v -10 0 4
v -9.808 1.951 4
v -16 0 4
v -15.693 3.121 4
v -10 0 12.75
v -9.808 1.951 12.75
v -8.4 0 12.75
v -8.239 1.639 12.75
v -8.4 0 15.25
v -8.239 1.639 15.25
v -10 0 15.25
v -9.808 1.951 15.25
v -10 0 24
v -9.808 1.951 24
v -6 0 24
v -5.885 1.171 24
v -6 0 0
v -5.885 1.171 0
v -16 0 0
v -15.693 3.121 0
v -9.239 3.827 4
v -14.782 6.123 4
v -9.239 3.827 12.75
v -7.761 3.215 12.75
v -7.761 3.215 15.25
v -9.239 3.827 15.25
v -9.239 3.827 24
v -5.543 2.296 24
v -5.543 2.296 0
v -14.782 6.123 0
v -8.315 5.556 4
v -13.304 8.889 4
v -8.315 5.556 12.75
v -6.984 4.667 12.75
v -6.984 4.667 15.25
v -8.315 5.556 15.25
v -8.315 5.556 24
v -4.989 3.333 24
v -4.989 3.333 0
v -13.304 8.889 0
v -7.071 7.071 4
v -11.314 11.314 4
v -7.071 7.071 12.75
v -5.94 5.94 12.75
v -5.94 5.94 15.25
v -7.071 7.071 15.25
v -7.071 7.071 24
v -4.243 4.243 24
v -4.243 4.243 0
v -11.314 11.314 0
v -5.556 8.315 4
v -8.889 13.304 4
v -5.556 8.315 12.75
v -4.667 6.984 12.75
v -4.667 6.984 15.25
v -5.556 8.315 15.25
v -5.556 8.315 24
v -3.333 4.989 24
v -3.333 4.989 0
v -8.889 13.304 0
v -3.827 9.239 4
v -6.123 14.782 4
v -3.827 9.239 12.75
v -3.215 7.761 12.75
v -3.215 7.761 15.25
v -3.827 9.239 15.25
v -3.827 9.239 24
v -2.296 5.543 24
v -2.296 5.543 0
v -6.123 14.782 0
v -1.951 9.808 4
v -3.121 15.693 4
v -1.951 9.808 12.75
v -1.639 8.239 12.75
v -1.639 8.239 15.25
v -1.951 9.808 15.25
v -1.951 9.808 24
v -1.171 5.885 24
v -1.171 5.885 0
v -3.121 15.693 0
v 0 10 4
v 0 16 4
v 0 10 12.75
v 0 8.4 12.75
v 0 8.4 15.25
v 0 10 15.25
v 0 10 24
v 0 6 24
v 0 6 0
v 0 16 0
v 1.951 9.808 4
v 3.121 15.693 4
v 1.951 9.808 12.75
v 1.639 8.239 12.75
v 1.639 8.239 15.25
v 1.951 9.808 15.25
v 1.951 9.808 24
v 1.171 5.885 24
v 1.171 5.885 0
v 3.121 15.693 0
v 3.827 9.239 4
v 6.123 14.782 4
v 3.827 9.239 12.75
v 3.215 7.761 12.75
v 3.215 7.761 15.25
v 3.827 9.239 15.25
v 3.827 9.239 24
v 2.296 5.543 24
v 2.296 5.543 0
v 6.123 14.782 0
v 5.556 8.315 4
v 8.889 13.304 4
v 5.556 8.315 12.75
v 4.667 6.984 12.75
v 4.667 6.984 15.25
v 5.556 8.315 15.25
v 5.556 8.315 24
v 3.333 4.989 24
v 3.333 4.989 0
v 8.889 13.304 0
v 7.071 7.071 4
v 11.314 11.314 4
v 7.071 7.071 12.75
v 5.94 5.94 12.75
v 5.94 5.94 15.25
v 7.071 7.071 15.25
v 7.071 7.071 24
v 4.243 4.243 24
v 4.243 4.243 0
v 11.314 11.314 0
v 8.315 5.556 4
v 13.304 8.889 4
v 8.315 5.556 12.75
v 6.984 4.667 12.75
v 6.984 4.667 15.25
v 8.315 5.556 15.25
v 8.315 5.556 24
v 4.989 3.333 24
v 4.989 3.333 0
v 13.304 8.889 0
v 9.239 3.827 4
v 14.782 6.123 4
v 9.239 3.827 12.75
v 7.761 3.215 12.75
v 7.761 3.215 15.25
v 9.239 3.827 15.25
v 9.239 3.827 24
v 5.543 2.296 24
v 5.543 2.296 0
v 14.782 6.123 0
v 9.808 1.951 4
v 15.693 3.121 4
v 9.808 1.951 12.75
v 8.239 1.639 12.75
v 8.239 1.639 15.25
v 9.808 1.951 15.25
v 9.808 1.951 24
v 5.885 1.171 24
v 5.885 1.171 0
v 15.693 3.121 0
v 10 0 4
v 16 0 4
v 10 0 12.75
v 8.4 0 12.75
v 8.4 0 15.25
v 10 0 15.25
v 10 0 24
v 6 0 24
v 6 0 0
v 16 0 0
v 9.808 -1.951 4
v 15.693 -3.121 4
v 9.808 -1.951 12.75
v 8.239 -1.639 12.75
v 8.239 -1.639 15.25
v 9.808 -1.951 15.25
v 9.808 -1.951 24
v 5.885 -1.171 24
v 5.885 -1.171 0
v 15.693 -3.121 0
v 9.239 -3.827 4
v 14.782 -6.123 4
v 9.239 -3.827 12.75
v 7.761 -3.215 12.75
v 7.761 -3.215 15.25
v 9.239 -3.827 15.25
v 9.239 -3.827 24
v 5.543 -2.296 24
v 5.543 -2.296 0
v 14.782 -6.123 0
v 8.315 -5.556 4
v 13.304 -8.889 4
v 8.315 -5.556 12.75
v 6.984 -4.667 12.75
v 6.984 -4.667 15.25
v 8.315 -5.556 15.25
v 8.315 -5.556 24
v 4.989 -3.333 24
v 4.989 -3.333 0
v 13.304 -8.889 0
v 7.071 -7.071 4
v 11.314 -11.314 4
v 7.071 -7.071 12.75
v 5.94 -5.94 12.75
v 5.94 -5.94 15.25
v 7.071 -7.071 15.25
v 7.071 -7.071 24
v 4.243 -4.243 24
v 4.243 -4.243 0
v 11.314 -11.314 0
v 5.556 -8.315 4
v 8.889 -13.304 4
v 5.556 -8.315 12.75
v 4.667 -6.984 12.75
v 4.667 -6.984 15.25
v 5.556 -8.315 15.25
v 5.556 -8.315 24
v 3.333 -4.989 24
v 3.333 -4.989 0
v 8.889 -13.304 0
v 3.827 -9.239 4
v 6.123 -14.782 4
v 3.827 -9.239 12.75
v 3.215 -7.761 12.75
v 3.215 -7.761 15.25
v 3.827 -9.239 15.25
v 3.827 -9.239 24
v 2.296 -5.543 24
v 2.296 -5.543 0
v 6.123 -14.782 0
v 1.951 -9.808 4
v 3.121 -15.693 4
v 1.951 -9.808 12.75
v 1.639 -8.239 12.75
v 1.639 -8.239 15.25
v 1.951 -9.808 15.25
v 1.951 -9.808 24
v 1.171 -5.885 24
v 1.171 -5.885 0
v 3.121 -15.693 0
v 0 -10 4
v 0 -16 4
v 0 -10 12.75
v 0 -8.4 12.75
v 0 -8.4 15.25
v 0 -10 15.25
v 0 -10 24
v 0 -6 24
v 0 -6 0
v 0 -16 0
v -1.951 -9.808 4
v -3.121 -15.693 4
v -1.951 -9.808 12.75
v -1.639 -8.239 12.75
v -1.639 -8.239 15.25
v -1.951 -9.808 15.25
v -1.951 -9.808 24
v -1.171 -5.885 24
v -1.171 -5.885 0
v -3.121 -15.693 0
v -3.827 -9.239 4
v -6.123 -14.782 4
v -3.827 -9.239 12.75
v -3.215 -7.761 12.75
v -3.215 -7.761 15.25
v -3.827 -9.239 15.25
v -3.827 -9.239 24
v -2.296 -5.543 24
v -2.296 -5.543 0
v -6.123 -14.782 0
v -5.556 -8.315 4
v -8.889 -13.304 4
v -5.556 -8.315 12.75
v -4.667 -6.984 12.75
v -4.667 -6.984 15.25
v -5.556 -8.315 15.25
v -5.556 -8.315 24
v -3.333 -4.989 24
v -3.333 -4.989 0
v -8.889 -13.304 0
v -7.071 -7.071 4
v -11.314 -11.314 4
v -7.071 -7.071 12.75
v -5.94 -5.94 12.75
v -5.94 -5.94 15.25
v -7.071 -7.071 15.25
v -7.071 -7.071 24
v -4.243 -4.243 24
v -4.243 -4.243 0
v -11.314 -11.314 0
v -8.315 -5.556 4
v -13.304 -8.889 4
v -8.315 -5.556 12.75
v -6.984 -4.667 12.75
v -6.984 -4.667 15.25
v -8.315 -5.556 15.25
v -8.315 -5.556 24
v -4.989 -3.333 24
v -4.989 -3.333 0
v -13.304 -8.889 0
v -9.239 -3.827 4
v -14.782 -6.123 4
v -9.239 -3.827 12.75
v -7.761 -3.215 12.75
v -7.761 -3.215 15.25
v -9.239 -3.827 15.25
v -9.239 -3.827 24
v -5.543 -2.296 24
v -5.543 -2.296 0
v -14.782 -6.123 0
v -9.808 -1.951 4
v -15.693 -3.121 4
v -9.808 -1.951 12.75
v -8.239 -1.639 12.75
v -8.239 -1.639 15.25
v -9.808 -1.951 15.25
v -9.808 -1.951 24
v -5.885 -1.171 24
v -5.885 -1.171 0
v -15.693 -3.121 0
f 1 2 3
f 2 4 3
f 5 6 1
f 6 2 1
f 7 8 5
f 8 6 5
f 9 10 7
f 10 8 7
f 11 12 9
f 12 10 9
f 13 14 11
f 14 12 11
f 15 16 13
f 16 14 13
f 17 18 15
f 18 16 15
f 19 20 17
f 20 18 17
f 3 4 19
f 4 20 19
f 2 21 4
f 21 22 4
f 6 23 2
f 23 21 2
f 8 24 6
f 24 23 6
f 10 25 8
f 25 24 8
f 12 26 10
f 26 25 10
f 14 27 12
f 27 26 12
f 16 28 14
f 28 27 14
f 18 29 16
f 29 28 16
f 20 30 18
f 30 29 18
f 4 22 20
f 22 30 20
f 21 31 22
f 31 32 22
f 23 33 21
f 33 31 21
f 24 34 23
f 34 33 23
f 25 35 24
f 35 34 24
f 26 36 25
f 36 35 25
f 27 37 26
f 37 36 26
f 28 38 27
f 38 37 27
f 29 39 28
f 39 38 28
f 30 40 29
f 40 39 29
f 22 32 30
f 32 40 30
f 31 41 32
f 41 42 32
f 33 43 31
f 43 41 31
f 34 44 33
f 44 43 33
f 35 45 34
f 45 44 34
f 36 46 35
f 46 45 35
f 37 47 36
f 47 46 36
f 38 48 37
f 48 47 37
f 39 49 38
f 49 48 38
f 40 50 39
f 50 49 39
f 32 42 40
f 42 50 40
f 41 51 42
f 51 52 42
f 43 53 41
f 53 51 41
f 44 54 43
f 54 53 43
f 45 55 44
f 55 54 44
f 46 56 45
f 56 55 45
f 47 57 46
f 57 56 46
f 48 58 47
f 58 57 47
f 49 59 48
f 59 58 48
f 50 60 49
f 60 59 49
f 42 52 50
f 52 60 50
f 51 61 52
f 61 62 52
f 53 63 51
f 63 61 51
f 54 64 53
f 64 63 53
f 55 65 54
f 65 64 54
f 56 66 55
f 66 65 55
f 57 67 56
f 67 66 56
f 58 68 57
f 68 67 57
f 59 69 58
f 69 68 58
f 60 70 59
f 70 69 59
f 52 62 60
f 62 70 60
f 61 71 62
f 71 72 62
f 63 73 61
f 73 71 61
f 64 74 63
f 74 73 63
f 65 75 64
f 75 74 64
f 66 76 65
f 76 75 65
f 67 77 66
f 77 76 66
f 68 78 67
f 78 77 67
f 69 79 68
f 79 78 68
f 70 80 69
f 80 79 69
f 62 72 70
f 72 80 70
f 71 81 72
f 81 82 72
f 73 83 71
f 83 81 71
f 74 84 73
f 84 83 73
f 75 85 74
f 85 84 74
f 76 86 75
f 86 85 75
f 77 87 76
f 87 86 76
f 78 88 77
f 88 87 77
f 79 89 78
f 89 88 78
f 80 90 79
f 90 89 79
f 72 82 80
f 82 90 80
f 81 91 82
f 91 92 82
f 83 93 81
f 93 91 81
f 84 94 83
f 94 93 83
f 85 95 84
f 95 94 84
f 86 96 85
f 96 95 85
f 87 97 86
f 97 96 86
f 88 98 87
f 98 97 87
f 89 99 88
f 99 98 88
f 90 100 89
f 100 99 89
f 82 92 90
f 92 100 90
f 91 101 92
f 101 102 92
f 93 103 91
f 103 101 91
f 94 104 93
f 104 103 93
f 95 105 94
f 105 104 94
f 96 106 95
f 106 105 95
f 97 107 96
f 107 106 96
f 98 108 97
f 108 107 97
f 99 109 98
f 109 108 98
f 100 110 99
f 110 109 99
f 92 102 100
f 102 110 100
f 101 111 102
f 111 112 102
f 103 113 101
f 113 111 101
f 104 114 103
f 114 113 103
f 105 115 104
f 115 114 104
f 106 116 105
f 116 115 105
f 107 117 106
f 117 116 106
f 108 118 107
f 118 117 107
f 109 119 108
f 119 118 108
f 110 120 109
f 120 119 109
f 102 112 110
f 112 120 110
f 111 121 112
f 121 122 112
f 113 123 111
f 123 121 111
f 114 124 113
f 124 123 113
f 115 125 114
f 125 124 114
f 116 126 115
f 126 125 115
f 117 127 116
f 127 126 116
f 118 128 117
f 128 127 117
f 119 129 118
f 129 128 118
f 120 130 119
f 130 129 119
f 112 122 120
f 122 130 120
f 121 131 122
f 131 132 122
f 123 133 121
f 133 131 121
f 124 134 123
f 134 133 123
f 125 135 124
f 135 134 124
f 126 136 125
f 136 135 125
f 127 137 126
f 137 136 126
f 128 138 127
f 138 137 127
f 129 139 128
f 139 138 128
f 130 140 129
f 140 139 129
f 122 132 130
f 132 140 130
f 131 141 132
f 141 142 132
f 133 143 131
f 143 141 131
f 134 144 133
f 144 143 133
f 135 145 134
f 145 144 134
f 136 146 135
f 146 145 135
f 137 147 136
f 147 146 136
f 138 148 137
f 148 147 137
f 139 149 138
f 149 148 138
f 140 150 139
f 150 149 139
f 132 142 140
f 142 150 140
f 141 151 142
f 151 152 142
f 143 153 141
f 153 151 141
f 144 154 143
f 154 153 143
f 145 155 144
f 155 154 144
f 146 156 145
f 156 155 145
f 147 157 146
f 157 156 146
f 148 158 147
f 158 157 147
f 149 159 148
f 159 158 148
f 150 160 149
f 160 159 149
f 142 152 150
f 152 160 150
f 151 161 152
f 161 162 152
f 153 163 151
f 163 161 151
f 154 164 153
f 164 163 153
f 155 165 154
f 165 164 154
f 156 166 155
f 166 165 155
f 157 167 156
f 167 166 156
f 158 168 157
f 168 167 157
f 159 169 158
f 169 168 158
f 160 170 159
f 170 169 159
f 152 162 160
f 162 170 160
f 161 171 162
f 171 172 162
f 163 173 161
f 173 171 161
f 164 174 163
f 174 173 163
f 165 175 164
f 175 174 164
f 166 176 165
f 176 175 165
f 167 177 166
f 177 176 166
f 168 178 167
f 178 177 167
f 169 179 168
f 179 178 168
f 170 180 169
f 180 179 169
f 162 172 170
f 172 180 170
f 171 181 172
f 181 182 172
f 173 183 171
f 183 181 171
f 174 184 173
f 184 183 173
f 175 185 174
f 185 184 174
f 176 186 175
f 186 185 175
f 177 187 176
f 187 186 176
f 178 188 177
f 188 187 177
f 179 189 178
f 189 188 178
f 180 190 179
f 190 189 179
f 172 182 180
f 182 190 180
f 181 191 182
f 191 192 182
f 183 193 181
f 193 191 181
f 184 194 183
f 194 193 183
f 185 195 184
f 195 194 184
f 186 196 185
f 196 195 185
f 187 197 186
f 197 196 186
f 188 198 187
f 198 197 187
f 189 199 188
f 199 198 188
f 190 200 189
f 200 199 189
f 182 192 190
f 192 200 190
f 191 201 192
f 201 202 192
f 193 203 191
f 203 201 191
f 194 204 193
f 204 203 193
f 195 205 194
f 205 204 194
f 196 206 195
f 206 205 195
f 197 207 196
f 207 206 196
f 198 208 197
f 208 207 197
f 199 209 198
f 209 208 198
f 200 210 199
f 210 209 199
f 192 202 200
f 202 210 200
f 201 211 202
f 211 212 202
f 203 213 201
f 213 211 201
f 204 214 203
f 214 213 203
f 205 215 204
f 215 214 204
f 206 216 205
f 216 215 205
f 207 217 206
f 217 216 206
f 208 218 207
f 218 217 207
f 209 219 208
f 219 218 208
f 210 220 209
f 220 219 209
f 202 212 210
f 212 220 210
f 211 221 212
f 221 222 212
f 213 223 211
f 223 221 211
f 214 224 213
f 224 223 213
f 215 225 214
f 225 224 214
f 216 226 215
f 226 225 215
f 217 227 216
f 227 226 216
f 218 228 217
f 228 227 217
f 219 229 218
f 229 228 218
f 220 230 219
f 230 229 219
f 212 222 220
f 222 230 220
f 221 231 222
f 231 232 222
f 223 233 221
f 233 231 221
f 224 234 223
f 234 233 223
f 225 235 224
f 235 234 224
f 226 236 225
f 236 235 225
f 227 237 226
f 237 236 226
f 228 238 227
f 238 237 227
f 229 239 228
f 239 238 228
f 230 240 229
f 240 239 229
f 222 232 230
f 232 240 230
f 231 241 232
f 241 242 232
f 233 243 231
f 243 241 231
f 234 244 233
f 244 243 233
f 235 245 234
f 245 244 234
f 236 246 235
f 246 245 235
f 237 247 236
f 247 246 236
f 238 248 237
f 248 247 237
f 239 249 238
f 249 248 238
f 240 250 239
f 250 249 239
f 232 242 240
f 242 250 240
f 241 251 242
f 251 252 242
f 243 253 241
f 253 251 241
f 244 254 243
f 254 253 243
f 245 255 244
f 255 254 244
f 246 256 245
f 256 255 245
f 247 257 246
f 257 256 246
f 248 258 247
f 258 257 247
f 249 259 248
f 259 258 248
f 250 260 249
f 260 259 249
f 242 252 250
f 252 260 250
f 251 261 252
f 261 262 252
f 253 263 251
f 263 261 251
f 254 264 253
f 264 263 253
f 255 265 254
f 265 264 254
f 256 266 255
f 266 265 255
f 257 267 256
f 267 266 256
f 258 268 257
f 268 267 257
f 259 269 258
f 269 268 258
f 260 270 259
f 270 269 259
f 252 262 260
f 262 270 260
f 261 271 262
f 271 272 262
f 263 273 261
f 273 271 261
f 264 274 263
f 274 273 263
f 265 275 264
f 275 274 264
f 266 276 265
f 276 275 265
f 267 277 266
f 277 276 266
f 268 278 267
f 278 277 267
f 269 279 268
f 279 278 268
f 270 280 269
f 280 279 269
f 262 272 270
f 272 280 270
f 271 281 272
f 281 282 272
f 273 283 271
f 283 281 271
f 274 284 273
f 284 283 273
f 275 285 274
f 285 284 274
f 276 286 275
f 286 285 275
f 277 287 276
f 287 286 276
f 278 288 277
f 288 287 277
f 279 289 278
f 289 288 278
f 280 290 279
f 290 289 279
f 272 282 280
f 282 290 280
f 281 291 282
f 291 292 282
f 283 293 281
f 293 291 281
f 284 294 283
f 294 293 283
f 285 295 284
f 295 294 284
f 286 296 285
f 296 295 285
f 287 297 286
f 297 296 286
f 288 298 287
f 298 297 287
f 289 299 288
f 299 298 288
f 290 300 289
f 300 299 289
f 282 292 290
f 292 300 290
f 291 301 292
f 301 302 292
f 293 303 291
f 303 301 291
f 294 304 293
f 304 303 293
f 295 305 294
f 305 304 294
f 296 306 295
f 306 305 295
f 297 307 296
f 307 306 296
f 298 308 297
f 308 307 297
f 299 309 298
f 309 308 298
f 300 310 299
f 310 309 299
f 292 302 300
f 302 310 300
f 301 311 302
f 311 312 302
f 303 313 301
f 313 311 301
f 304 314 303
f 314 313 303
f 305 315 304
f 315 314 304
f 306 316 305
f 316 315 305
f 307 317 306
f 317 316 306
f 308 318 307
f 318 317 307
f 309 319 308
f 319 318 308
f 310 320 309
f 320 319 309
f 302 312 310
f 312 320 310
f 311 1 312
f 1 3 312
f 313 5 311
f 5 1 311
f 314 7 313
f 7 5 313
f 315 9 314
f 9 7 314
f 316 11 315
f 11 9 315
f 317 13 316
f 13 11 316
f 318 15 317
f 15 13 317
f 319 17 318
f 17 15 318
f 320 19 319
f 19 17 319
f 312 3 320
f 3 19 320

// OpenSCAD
$fn = 32;

// ----------------------------------------------------------------------
// Grooved revolve: flanged, bore R6
// ----------------------------------------------------------------------

// --- parameters (mm) ---
bore_r = 6;               // bore radius
outer_r = 10;             // outer radius of the body
total_h = 24;             // overall height, Z
wall = 4;                 // radial wall thickness
groove_w = 2.5;           // groove width
groove_d = 1.6;           // groove depth
grooves = 1;              // number of outer grooves
flange_r = 16;            // flange radius
flange_h = 4;             // flange height

bbox_x = 2 * flange_r;  // full diameter
bore_d = 2 * bore_r;  // bore diameter
body_d = 2 * outer_r;  // body diameter
flange_d = 2 * flange_r;  // flange diameter
revolve_angle = 360;  // full turn around the Z axis

profile = [[6, 0], [10, 0], [16, 0], [16, 4], [10, 4], [10, 12.75], [8.4, 12.75], [8.4, 15.25], [10, 15.25], [10, 24], [6, 24]];  // primary outline, 11 points, counter clockwise

// --- the one profile operation ---
rotate_extrude(angle = revolve_angle) polygon(points = profile);
